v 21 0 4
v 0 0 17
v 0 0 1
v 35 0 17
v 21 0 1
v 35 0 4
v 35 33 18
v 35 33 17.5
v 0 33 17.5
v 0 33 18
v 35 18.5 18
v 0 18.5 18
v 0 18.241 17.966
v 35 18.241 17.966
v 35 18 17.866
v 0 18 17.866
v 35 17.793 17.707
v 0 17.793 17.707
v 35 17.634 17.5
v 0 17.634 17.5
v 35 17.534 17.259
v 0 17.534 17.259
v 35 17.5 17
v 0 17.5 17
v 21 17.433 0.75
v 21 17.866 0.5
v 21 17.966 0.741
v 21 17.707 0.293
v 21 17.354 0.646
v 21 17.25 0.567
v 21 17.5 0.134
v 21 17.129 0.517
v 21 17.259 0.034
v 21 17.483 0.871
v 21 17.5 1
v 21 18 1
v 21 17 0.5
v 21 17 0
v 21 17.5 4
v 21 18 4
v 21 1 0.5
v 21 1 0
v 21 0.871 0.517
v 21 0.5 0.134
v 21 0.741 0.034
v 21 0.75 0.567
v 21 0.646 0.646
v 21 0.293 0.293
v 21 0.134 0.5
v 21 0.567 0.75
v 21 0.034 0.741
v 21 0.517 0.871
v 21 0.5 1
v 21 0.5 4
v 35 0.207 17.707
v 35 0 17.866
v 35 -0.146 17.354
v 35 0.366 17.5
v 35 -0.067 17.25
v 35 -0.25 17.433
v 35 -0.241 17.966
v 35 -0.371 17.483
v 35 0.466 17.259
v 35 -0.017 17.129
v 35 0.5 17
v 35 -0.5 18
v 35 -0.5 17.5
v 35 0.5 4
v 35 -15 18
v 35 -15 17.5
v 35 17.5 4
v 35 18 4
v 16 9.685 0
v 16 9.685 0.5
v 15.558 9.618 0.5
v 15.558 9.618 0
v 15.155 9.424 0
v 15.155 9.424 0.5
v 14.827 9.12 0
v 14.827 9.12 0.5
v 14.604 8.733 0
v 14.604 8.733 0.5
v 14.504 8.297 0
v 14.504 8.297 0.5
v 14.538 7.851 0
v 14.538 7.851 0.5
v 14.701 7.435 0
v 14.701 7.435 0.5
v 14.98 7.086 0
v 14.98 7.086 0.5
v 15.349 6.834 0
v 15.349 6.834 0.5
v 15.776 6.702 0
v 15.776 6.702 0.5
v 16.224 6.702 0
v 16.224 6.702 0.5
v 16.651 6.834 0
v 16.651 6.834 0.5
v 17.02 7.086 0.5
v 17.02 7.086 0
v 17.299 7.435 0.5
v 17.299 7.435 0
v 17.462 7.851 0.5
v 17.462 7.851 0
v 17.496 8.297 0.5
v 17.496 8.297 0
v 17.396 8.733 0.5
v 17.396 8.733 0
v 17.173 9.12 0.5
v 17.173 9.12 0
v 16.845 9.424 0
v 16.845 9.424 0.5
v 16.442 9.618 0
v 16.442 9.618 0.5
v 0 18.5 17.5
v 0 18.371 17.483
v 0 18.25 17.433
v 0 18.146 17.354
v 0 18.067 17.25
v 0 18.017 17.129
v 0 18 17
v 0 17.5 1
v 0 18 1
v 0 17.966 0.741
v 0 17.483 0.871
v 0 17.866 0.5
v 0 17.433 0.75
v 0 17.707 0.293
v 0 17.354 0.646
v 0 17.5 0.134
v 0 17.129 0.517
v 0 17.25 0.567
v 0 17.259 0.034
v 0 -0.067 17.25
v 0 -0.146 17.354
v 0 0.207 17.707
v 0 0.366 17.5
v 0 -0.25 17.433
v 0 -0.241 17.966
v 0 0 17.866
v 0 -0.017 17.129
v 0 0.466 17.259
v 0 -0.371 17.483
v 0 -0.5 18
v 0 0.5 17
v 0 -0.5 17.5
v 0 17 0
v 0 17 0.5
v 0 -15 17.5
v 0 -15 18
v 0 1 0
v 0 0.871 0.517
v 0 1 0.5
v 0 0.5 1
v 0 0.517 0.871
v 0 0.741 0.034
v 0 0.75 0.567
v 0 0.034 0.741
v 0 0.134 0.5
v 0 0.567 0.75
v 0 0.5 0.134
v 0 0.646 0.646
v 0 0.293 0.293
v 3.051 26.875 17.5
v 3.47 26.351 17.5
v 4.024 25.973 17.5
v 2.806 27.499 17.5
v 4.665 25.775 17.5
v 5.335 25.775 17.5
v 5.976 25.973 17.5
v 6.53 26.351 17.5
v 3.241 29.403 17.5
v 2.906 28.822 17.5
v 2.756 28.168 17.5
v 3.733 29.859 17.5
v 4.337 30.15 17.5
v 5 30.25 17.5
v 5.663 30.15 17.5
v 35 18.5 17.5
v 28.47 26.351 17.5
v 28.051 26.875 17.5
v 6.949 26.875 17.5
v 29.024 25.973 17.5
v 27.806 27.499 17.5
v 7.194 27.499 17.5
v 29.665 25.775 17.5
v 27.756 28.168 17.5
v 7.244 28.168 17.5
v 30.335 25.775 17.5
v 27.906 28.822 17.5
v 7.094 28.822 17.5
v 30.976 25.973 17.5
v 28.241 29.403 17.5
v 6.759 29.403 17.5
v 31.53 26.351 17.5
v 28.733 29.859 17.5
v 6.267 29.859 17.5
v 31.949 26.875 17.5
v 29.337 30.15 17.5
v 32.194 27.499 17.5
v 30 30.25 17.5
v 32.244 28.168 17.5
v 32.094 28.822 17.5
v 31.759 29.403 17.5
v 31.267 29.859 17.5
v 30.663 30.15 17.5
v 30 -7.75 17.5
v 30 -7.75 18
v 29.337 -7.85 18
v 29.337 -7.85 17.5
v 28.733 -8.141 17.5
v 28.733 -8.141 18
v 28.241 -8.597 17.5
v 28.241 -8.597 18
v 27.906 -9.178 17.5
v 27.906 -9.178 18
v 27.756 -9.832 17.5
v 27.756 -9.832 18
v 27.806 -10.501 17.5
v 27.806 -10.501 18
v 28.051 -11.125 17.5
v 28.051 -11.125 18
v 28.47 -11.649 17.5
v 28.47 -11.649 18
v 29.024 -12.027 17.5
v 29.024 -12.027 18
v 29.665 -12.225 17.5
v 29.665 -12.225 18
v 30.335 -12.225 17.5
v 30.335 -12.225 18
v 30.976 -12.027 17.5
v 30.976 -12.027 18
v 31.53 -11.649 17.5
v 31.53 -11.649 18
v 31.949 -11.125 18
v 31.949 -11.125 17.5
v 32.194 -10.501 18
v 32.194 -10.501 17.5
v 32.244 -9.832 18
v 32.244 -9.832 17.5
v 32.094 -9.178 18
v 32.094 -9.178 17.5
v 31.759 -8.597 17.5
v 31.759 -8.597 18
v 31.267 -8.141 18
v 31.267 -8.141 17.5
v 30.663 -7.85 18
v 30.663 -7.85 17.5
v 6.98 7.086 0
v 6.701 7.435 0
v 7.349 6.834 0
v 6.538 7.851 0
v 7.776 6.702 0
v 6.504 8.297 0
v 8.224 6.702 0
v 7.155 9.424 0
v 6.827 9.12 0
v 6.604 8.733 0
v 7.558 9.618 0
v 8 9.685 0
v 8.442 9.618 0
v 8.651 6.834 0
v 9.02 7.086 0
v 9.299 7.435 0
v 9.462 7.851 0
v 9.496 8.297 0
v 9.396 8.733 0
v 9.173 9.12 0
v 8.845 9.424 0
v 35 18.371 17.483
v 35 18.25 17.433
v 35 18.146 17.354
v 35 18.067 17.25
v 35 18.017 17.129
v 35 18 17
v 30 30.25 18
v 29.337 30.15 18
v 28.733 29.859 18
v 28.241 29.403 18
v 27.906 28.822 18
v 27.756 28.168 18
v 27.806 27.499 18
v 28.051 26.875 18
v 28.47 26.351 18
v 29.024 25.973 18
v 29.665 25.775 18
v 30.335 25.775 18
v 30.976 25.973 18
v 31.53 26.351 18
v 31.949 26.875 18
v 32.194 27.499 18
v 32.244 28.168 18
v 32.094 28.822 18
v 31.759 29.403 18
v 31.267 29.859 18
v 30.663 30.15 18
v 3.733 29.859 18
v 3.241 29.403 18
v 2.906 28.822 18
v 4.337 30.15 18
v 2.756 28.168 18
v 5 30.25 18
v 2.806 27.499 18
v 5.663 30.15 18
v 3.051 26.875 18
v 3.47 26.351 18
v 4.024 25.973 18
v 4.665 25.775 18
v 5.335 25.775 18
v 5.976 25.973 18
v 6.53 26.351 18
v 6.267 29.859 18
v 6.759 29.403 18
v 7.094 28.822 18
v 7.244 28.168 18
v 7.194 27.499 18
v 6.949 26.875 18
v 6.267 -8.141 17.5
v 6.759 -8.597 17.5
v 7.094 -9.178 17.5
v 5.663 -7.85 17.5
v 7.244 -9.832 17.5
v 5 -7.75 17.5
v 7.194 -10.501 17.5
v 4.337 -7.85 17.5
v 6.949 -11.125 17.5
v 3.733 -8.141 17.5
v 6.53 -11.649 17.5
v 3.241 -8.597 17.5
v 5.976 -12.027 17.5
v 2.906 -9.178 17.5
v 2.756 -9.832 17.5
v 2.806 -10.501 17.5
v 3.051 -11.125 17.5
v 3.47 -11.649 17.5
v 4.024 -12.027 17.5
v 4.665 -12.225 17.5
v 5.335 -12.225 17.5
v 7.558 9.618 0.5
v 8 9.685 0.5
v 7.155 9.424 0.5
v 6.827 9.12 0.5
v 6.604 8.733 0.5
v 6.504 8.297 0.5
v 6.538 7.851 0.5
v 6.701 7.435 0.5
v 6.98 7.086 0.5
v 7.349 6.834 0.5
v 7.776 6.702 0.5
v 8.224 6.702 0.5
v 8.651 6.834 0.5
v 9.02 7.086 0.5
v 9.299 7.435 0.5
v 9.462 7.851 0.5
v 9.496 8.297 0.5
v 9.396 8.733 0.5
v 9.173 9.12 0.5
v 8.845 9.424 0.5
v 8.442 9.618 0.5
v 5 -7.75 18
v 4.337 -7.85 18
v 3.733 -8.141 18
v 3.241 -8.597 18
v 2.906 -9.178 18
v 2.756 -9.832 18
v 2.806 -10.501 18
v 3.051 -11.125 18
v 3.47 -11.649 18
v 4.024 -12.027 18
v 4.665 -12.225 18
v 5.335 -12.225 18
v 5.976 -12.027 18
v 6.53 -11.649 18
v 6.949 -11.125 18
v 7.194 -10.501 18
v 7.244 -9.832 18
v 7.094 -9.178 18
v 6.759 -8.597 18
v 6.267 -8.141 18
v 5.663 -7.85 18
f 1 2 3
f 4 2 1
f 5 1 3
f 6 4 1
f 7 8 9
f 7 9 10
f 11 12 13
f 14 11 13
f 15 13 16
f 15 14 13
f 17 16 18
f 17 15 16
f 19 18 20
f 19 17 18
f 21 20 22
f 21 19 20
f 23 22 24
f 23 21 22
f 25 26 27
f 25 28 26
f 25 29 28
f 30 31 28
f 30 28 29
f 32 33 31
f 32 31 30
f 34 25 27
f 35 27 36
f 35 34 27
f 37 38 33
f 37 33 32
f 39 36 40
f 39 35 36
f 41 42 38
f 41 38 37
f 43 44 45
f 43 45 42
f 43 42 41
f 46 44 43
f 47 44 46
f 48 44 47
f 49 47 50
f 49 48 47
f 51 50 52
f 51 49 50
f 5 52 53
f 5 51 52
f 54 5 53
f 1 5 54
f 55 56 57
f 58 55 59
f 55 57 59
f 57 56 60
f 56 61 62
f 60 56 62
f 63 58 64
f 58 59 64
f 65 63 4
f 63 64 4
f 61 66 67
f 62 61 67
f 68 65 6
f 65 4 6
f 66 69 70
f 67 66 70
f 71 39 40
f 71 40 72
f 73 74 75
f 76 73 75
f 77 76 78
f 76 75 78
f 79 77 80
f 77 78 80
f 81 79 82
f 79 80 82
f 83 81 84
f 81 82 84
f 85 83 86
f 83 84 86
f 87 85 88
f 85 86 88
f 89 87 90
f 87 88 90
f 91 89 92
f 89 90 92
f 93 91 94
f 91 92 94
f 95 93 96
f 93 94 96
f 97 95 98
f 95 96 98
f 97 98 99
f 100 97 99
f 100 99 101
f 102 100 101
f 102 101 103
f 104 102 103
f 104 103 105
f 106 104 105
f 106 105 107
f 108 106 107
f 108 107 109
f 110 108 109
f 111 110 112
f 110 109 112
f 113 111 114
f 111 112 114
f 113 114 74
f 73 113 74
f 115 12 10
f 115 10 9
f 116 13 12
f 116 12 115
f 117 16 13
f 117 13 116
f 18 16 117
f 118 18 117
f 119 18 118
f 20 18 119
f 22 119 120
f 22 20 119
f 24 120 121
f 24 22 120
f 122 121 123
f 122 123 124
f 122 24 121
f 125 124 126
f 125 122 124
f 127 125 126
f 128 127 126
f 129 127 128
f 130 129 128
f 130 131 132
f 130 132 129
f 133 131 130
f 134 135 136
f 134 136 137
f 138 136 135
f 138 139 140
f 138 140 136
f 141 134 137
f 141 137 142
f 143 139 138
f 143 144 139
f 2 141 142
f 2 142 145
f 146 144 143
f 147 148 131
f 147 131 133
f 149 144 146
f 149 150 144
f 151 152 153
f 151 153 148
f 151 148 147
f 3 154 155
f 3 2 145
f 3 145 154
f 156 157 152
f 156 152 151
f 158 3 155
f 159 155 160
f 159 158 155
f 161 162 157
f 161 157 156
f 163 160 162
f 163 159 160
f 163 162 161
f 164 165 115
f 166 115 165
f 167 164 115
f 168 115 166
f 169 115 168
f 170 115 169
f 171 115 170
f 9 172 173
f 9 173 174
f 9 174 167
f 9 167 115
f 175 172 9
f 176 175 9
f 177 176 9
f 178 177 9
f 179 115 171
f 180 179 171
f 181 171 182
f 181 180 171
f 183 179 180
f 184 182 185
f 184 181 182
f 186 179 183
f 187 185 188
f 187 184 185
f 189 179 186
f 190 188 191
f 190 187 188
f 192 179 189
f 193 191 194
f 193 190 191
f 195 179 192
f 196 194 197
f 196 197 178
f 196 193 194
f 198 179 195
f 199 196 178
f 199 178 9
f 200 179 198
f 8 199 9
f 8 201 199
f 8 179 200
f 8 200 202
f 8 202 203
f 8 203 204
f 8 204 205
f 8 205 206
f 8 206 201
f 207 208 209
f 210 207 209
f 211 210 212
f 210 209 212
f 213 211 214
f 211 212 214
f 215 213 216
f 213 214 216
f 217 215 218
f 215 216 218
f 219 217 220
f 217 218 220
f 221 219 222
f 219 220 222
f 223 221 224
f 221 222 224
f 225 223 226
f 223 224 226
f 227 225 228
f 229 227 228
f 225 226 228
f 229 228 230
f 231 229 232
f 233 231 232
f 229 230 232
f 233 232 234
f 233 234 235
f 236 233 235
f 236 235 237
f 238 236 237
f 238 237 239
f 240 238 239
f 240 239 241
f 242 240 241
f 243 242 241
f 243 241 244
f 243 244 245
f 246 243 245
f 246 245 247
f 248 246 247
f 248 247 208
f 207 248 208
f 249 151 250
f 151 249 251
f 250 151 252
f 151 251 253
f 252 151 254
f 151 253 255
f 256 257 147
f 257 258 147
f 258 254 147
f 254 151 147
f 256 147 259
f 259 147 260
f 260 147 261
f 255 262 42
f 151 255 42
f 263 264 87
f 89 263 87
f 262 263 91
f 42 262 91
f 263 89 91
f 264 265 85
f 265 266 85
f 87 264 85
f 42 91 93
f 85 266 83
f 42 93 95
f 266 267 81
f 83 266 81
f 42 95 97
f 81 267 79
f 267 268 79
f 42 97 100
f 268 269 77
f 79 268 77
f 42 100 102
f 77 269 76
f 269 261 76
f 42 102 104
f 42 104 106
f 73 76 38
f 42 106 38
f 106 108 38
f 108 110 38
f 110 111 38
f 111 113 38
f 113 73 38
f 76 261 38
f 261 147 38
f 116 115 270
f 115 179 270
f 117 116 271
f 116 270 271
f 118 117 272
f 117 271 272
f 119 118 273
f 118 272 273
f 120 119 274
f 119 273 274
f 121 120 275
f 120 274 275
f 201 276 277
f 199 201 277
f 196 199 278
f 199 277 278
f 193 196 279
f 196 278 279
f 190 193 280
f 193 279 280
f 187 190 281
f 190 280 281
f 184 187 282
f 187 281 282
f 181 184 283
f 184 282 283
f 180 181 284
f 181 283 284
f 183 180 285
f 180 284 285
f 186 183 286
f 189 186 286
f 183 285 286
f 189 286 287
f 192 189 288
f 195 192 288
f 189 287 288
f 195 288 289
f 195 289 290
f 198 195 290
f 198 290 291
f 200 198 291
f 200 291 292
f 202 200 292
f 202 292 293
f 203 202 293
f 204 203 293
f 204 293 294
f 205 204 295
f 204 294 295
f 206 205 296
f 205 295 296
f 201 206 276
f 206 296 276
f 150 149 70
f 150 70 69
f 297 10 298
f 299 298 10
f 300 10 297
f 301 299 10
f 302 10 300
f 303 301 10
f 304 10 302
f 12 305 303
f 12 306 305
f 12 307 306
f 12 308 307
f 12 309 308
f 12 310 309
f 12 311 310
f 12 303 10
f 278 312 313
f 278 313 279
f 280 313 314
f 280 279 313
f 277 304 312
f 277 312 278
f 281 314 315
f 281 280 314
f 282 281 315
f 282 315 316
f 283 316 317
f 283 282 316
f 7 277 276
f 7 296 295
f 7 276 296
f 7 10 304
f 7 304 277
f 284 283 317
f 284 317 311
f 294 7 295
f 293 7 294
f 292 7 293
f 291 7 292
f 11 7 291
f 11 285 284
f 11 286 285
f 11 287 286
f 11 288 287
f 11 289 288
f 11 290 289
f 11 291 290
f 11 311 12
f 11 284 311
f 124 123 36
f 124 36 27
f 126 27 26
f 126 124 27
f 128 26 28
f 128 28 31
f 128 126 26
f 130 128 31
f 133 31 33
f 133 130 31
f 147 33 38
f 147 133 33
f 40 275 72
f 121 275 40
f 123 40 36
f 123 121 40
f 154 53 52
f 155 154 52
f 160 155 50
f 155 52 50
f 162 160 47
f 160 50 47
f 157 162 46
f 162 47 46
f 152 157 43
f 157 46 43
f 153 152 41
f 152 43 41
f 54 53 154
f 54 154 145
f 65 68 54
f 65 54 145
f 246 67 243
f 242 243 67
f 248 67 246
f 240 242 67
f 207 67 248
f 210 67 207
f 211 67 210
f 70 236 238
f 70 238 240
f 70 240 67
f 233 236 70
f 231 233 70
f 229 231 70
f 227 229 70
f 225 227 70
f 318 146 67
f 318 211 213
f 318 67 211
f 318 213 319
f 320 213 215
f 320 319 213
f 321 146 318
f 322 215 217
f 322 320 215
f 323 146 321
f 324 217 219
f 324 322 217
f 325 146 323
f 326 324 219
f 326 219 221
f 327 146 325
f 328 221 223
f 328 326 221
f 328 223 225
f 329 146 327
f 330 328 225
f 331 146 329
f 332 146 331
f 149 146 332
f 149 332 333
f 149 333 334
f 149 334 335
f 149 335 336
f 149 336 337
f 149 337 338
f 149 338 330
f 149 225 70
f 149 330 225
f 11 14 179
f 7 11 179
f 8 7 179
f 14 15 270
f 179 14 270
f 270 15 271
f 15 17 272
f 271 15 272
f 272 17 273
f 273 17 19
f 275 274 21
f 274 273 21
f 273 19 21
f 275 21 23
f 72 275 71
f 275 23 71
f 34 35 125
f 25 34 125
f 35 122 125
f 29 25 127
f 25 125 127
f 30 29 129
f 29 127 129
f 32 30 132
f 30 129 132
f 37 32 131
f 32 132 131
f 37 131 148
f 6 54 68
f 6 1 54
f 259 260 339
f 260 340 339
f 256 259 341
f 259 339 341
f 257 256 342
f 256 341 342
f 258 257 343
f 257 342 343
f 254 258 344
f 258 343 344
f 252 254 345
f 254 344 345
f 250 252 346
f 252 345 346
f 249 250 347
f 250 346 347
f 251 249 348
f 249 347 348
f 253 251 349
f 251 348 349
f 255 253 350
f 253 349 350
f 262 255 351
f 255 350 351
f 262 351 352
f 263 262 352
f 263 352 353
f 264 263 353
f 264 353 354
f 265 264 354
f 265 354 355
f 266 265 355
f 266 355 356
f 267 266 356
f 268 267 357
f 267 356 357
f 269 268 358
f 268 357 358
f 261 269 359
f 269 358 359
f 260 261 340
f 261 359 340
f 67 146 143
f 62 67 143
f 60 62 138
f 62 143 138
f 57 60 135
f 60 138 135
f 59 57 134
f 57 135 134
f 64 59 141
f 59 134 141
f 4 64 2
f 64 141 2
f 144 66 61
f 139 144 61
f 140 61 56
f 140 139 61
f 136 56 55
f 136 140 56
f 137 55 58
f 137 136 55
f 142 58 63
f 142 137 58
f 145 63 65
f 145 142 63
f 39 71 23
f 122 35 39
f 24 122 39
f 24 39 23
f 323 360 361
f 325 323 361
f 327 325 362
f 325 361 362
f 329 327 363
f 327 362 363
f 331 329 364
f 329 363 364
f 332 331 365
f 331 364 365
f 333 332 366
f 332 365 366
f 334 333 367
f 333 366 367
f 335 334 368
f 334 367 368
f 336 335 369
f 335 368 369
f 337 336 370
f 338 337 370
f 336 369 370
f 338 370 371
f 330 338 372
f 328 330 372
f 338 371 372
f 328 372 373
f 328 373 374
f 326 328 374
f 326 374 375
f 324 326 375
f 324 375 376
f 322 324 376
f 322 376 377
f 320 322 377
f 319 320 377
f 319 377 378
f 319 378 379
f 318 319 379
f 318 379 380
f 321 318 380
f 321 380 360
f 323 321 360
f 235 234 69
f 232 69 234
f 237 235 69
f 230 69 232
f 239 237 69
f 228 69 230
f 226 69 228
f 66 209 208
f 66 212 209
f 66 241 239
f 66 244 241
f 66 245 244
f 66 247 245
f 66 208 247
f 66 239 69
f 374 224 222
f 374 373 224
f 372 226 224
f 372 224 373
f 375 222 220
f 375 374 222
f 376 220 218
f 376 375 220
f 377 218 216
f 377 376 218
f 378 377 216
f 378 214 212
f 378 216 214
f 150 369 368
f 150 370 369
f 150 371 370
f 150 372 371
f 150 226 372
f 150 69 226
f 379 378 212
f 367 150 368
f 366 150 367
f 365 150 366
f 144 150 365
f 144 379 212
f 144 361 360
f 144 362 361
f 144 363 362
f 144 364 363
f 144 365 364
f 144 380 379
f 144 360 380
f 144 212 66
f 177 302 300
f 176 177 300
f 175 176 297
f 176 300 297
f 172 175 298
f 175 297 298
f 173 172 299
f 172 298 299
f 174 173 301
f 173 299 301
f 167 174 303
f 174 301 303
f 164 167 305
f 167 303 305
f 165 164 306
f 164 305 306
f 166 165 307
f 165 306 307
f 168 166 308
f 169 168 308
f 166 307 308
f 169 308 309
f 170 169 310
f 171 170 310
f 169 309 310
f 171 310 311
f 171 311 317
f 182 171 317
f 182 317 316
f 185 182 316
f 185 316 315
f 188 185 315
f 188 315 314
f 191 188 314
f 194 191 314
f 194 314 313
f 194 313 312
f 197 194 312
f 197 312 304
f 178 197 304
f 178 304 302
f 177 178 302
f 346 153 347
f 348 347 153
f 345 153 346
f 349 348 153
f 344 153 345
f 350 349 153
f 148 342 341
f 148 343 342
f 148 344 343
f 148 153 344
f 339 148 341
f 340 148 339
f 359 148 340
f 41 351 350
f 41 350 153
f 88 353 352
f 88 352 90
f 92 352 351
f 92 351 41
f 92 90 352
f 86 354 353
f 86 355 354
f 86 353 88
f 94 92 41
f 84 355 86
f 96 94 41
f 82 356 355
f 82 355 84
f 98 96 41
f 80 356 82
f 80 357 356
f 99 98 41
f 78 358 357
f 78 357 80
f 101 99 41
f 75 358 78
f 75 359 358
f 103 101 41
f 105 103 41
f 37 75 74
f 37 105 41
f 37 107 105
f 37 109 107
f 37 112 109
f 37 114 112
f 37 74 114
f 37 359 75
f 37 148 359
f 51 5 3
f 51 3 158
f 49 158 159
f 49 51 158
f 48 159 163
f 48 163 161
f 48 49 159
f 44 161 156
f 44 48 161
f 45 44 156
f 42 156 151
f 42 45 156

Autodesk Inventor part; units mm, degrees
ref_plane "YZ Plane" through (0, 0, 0) normal (1, 0, 0) x (0, 1, 0)
ref_plane "XZ Plane" through (0, 0, 0) normal (0, 1, 0) x (-1, 0, 0)
ref_plane "XY Plane" through (0, 0, 0) normal (0, 0, 1) x (1, 0, 0)
sketch "Skizze2" plane through (0, 0, 0) normal (0, 0, 1) x (1, 0, 0)
  line L0 (0, 18) -> (35, 18)
  line L1 (35, 18) -> (35, 0)
  line L2 (35, 0) -> (0, 0)
  line L3 (0, 0) -> (0, 18)
  dimension "d12" = 18
  dimension "d13" = 35
extrude "Grobblech2" add sketch "Skizze2" along normal blind 0.5
sketch "Skizze3" plane through (0, 17.5, 0) normal (0, 1, 0) x (-1, 0, 0)
  line L0 (-35, 0) -> (0, 0)
  line L1 (0, 0) -> (0, 18)
  line L2 (0, 18) -> (-35, 18)
  line L3 (-35, 18) -> (-35, 0)
edge flange "Lasche1" height 18 angle 90 thickness 0.5 bend radius 0.5 thickness toward (0, 1, 0) relief tear relief width 0.5 relief depth 0.25 edges at (17.5, 18, 0.5) wall of the first edge with corners at (35, 17.5, 0) (0, 17.5, 0) (0, 17.5, 18) (35, 17.5, 18)
bend "Biegung1"
corner "Ecke1"
sketch "Skizze4" plane through (35, 0.5, 0) normal (0, -1, 0) x (1, 0, 0)
  line L0 (-35, 0) -> (0, 0)
  line L1 (0, 0) -> (0, 18)
  line L2 (0, 18) -> (-35, 18)
  line L3 (-35, 18) -> (-35, 0)
edge flange "Lasche2" height 18 angle 90 thickness 0.5 bend radius 0.5 thickness toward (0, -1, 0) relief tear relief width 0.5 relief depth 0.25 edges at (17.5, 0, 0.5) wall of the first edge with corners at (0, 0.5, 0) (35, 0.5, 0) (35, 0.5, 18) (0, 0.5, 18)
bend "Biegung2"
corner "Ecke2"
sketch "Skizze5" plane through (35, 17.5, 17.5) normal (0, 0, 1) x (1, 0, 0)
  line L0 (-35, 0) -> (0, 0)
  line L1 (0, 0) -> (0, 15.5)
  line L2 (0, 15.5) -> (-35, 15.5)
  line L3 (-35, 15.5) -> (-35, 0)
edge flange "Lasche3" height 15.5 angle 90 thickness 0.5 bend radius 0.5 thickness toward (0, 0, 1) relief tear relief width 0.5 relief depth 0.25 edges at (17.5, 18, 18) wall of the first edge with corners at (0, 17.5, 17.5) (35, 17.5, 17.5) (35, 33, 17.5) (0, 33, 17.5)
bend "Biegung3"
corner "Ecke3"
sketch "Skizze6" plane through (0, 0.5, 17.5) normal (0, 0, 1) x (1, 0, 0)
  line L0 (35, 0) -> (0, 0)
  line L1 (0, 0) -> (0, -15.5)
  line L2 (0, -15.5) -> (35, -15.5)
  line L3 (35, -15.5) -> (35, 0)
edge flange "Lasche4" height 15.5 angle 90 thickness 0.5 bend radius 0.5 thickness toward (0, 0, 1) relief tear relief width 0.5 relief depth 0.25 edges at (17.5, 0, 18) wall of the first edge with corners at (35, 0.5, 17.5) (0, 0.5, 17.5) (0, -15, 17.5) (35, -15, 17.5)
bend "Biegung4"
corner "Ecke4"
sketch "Skizze7" plane through (0, 0, 1) normal (0, -1, 0) x (1, 0, 0)
  line L0 (35, -1) -> (21, -1)
  line L1 (21, -1) -> (21, 3)
  line L2 (21, 3) -> (35, 3)
  line L3 (35, 3) -> (35, -1)
  line L4 (35, -1) -> (0, -1) projected
  dimension "d55" = 4
  dimension "d56" = 14
extrude "Ausschneiden1" cut sketch "Skizze7" against normal up to surface (18 mm away)
sketch "Skizze8" plane through (0, 0, 0) normal (0, 0, -1) x (-1, 0, 0)
  line L0 (-21, 17) -> (-21, 1) projected
  line L1 (-21, 1) -> (0, 1) projected
  line L2 (0, 17) -> (0, 1) projected
  line L3 (0, 17) -> (-21, 17) projected
  line L4 (0, 9) -> (-30.5159, 9) construction
  line L5 (-35, -15) -> (0, -15) projected
  line L6 (-17.5, -15) -> (-17.5, 33) construction
  line L7 (0, 33) -> (-35, 33) projected
  point P0 (0, 0)
  point P1 (-30, 28)
  point P2 (-5, 28)
  point P3 (-30, -10)
  point P4 (-5, -10)
  dimension "d59" = 25
  dimension "d60" = 38
  dimension "d61" = 25
  dimension "d62" = 38
hole "Bohrung1" at (30, 28, 0) at (5, 28, 0) at (30, -10, 0) at (5, -10, 0) direction (0, 0, 1) diameter 4.5 depth 18
sketch "Skizze9" plane through (0, 0, 0) normal (0, 0, -1) x (-1, 0, 0)
  line L0 (0, 17) -> (0, 1) projected
  point P0 (0, 0)
  point P1 (-8, 8.1851)
  point P2 (-16, 8.1851)
  dimension "d70" = 8
  dimension "d71" = 8
hole "Bohrung2" at (8, 8.1851, 0) at (16, 8.1851, 0) direction (0, 0, 1) diameter 3 end through all
equation "\"d57\" = Stärke"
equation "\"d68\" = Stärke"
equation "\"d14\" = Stärke"
equation "\"d15\" = BreiteBiegungsfreistellung"
equation "\"d16\" = TiefeBiegungsfreistellung"
equation "\"d17\" = MinimalRest"
equation "\"d18\" = Übergangsradius"
equation "\"d21\" = Biegeradius"
equation "\"d22\" = GrößeEckenfreistellung"
equation "\"d23\" = Abstandsgröße"
equation "\"d24\" = JacobiRadiusGröße"
equation "\"d25\" = BreiteBiegungsfreistellung"
equation "\"d26\" = TiefeBiegungsfreistellung"
equation "\"d27\" = MinimalRest"
equation "\"d28\" = Übergangsradius"
equation "\"d31\" = Biegeradius"
equation "\"d32\" = GrößeEckenfreistellung"
equation "\"d33\" = Abstandsgröße"
equation "\"d34\" = JacobiRadiusGröße"
equation "\"d35\" = BreiteBiegungsfreistellung"
equation "\"d36\" = TiefeBiegungsfreistellung"
equation "\"d37\" = MinimalRest"
equation "\"d38\" = Übergangsradius"
equation "\"d41\" = Biegeradius"
equation "\"d42\" = GrößeEckenfreistellung"
equation "\"d43\" = Abstandsgröße"
equation "\"d44\" = JacobiRadiusGröße"
equation "\"d45\" = BreiteBiegungsfreistellung"
equation "\"d46\" = TiefeBiegungsfreistellung"
equation "\"d47\" = MinimalRest"
equation "\"d48\" = Übergangsradius"
equation "\"d51\" = Biegeradius"
equation "\"d52\" = GrößeEckenfreistellung"
equation "\"d53\" = Abstandsgröße"
equation "\"d54\" = JacobiRadiusGröße"
equation "\"Biegeradius\" = Stärke"
equation "\"BreiteBiegungsfreistellung\" = Stärke"
equation "\"TiefeBiegungsfreistellung\" = 0.5 * Stärke"
equation "\"GrößeEckenfreistellung\" = 4 * Stärke"
equation "\"MinimalRest\" = 2 * Stärke"
equation "\"Übergangsradius\" = Biegeradius"
equation "\"JacobiRadiusGröße\" = Biegeradius"
equation "\"Abstandsgröße\" = Stärke"
equation "\"Stärke\" = 0.5"
properties part number "Bügelbefestigung" material "Stahl, galvanisiert"
